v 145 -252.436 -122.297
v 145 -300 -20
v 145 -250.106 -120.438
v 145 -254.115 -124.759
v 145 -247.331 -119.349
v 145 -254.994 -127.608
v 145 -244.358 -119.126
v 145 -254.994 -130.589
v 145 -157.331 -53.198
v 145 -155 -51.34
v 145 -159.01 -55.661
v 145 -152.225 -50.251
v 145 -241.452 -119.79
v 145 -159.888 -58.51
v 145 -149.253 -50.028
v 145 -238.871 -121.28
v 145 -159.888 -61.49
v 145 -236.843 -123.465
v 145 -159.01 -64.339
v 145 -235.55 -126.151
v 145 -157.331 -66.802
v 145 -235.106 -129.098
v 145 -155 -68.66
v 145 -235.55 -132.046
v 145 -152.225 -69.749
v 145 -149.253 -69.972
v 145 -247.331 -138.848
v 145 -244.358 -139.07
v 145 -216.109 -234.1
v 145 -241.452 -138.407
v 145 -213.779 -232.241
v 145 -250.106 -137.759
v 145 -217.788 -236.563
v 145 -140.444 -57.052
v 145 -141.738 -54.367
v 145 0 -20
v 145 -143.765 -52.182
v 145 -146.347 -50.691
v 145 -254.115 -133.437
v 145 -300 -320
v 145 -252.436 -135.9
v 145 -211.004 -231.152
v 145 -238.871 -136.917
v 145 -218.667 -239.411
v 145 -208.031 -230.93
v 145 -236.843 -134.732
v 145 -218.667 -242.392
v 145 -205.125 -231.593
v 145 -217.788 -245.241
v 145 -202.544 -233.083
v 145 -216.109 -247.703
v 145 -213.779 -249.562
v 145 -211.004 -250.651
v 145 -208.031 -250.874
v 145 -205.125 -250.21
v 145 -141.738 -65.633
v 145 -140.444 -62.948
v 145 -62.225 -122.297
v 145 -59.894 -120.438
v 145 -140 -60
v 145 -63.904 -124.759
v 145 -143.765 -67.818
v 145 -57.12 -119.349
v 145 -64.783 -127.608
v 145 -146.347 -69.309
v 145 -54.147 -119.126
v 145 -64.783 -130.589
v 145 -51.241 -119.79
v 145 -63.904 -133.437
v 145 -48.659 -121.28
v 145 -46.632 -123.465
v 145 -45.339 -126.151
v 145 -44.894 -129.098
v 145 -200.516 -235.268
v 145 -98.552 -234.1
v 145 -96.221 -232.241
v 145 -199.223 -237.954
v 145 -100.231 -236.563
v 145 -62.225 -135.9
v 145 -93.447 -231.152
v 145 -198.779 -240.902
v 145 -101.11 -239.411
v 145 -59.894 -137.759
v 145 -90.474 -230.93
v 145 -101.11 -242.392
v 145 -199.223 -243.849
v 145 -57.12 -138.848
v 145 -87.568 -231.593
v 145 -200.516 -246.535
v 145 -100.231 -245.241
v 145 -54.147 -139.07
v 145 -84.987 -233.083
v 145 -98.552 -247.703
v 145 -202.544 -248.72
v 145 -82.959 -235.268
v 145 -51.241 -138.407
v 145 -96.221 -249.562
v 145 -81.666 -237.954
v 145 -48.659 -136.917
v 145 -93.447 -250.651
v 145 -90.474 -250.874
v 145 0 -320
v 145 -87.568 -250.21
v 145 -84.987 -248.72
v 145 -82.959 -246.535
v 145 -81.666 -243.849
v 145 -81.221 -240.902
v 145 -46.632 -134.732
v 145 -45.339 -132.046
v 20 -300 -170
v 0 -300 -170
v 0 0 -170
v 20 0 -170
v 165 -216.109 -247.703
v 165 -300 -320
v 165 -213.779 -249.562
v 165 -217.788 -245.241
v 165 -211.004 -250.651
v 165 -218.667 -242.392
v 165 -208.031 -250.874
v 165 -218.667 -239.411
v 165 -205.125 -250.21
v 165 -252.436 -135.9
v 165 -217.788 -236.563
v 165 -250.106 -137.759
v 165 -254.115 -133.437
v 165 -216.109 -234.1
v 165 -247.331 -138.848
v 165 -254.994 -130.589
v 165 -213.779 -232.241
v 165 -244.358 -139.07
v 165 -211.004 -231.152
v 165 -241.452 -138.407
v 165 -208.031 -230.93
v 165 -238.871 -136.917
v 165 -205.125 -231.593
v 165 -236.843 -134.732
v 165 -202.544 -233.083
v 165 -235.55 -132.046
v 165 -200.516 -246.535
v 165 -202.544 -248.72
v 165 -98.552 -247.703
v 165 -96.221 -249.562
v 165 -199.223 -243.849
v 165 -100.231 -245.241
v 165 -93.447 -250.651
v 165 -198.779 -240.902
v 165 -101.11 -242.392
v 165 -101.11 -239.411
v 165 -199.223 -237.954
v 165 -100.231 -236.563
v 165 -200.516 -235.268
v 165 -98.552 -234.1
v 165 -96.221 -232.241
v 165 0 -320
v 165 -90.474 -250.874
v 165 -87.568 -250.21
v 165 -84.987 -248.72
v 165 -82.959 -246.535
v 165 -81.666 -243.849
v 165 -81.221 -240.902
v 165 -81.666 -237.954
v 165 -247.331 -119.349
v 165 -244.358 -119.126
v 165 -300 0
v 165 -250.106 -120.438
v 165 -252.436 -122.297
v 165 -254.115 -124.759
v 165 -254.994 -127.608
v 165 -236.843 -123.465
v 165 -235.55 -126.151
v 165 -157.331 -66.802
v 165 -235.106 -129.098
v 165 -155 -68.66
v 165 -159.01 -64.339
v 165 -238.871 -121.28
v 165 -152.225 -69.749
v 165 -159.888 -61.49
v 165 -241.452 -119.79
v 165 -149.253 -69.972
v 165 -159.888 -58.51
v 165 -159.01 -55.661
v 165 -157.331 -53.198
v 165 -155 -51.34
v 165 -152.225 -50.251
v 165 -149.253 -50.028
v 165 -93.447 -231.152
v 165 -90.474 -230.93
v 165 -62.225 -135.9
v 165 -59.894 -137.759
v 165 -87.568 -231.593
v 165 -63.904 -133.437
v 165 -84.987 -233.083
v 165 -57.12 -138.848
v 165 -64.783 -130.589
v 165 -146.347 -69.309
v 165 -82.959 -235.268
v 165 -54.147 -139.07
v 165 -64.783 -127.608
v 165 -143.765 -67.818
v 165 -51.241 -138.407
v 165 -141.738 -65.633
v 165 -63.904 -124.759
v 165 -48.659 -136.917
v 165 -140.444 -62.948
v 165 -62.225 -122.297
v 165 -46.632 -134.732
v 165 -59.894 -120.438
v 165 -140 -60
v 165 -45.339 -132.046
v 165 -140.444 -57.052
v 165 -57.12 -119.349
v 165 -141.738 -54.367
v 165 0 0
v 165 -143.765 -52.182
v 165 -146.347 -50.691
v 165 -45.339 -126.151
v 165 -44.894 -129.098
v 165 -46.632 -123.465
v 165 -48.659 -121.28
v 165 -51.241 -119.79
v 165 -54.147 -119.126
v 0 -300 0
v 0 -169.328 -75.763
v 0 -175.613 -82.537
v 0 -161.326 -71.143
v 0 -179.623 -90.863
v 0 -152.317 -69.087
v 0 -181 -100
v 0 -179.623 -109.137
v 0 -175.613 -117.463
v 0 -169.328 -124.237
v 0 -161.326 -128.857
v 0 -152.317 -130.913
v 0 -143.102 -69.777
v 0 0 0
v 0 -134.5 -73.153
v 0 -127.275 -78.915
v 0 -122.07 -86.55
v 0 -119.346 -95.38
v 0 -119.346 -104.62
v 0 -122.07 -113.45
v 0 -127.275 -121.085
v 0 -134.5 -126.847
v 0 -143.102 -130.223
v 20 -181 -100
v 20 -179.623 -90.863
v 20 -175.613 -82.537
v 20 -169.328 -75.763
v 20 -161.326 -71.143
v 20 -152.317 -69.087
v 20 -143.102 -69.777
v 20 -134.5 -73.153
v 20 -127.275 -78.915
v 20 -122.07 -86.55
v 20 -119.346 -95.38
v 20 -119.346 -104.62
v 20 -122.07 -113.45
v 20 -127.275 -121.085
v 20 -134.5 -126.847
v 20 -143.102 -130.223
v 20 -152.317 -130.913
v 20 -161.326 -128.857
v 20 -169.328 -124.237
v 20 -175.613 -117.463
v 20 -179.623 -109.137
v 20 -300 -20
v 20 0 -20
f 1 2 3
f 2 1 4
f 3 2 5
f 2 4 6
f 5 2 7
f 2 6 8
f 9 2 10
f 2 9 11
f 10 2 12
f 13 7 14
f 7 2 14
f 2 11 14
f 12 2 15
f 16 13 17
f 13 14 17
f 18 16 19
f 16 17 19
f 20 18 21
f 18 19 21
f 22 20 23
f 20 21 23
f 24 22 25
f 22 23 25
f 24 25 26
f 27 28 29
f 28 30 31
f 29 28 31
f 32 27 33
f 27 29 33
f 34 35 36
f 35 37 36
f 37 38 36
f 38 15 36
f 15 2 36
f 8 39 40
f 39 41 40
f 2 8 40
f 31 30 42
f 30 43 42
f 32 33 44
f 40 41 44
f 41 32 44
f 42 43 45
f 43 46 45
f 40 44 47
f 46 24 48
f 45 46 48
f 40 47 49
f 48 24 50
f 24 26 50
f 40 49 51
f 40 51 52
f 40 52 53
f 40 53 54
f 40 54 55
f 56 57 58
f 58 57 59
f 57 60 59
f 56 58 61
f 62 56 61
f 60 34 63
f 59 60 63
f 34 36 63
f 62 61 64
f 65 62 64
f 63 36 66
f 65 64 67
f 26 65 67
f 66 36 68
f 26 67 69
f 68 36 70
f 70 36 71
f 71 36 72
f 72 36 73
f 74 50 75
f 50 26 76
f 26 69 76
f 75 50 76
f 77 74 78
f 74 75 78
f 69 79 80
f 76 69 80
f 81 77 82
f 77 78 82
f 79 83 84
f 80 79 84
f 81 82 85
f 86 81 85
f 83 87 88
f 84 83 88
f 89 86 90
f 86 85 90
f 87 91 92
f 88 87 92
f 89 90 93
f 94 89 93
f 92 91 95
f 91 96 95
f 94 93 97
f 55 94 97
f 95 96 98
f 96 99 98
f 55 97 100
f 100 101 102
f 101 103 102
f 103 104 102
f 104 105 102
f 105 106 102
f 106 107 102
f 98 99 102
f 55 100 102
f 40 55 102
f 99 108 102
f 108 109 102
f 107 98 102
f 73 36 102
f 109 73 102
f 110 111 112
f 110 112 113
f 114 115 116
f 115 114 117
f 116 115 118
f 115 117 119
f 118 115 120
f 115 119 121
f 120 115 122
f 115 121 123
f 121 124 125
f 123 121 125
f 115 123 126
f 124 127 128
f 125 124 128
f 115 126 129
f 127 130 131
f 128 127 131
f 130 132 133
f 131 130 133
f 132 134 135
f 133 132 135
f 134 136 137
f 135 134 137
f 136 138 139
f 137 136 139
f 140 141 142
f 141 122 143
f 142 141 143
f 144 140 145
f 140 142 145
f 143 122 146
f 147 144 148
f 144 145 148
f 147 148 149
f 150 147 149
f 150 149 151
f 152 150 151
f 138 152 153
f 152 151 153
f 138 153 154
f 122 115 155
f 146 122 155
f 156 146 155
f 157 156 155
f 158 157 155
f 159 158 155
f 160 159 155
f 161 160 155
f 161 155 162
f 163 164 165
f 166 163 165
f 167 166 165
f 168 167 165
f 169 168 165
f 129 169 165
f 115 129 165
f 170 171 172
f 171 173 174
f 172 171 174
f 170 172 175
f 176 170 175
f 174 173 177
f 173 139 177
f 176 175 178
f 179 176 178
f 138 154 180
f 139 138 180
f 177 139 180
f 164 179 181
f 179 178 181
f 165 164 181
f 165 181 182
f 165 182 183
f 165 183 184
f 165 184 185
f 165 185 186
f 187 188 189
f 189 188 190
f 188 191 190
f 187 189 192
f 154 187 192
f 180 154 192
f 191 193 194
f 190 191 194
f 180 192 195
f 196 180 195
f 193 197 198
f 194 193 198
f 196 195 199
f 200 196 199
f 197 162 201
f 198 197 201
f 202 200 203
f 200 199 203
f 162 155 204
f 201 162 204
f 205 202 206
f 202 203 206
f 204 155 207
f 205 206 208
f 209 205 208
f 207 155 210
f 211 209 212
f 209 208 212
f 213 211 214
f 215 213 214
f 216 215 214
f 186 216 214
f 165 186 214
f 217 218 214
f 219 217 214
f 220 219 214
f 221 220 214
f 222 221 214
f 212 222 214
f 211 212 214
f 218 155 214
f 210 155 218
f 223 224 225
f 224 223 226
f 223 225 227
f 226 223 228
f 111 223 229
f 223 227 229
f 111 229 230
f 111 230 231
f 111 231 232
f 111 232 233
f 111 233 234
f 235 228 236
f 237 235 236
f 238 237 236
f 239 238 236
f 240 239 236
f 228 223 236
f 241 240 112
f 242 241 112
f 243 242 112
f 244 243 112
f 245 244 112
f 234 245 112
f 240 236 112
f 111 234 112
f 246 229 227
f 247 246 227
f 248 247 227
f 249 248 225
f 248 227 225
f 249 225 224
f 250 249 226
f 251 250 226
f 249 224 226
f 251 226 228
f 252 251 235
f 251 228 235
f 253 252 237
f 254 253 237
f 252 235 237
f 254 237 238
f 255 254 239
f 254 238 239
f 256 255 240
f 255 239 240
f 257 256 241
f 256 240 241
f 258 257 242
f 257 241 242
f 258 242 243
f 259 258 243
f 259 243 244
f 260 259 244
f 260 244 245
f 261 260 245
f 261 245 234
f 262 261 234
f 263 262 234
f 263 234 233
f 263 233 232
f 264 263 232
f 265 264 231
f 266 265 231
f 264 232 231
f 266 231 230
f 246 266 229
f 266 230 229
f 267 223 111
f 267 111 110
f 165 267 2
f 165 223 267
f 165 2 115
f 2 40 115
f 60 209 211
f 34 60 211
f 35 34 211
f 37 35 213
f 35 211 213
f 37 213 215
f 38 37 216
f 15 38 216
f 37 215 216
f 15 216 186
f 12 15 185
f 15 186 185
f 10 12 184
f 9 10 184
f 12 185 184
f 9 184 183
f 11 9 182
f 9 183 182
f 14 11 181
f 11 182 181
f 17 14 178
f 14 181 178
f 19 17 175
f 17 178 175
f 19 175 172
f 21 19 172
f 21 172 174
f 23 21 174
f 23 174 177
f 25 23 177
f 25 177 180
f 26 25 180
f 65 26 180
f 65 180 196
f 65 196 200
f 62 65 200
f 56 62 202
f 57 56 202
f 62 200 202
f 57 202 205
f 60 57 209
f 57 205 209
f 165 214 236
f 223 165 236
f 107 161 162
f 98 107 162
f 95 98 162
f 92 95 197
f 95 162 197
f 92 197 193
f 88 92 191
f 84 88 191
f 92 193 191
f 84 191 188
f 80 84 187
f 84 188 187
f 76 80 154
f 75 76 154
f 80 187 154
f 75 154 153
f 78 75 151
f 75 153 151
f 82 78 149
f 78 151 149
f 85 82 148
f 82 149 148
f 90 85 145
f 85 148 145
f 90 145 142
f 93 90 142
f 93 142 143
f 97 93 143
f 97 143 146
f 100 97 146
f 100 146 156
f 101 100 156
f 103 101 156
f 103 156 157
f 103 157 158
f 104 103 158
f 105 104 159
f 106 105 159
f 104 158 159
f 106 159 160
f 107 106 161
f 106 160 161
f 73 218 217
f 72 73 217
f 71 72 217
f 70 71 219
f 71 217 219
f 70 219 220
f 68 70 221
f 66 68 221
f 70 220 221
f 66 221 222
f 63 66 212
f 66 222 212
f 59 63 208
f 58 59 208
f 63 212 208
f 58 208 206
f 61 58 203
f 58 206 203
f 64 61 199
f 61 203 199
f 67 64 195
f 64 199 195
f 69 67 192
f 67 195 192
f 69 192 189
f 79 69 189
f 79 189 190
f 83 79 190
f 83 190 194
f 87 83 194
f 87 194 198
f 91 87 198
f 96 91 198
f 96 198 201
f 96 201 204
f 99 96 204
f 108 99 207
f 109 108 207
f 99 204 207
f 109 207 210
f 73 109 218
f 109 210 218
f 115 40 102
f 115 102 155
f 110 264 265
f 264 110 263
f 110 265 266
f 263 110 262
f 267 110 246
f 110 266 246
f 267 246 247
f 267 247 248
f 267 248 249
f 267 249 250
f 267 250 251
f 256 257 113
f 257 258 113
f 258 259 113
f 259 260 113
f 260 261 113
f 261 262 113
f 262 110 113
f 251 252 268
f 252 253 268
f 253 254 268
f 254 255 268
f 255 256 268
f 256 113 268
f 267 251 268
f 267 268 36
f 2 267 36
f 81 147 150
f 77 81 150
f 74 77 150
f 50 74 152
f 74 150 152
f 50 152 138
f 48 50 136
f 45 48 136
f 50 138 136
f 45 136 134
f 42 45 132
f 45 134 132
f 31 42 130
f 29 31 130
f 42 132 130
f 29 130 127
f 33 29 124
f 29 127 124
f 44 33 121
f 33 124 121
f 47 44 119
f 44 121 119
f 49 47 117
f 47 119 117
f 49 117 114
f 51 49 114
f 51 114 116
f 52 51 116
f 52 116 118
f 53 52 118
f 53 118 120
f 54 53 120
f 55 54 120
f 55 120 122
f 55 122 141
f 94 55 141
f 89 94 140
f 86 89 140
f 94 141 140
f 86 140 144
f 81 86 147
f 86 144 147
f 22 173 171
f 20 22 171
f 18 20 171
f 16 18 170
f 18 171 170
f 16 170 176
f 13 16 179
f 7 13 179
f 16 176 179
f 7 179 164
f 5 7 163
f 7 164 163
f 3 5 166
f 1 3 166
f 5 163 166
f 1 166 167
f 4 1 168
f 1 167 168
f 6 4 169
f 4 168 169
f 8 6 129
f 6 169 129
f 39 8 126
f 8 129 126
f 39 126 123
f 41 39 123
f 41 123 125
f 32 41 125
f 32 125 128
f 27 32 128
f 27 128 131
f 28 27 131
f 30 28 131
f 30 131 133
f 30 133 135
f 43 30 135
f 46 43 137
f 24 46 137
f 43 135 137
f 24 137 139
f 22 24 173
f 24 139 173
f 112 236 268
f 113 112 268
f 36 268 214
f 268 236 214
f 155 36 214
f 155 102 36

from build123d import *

# Parameters (mm, degrees)
F1_DEPTH = 300
F2_R     = 31
F3_DEPTH = 20
F4_R     = 10
F5_DEPTH = 20


with BuildPart() as f1:
    # F0 (on Front) → F1 (new body)
    with BuildSketch(Plane.XZ):
        Polygon((165, 0), (0, 0), (0, -170), (20, -170), (20, -20), (145, -20), (145, -320), (165, -320), (165, -20), align=None)
    extrude(amount=F1_DEPTH)

    # F2 (on face) → F3 (cut, through all)
    with BuildSketch(Plane(origin=(0, 0, 0), x_dir=(0, -1, 0), z_dir=(-1, 0, 0))):
        with Locations((150, -100)):
            Circle(F2_R)
    extrude(amount=-F3_DEPTH, mode=Mode.SUBTRACT)

    # F4 (on face) → F5 (cut, through all)
    with BuildSketch(Plane.YZ.offset(165)):
        with Locations((-150, -60)):
            Circle(F4_R)
        with Locations((-245.105652, -129.098301)):
            Circle(F4_R)
        with Locations((-208.778525, -240.901699)):
            Circle(F4_R)
        with Locations((-91.221475, -240.901699)):
            Circle(F4_R)
        with Locations((-54.894348, -129.098301)):
            Circle(F4_R)
    extrude(amount=-F5_DEPTH, mode=Mode.SUBTRACT)


solid = f1.part
